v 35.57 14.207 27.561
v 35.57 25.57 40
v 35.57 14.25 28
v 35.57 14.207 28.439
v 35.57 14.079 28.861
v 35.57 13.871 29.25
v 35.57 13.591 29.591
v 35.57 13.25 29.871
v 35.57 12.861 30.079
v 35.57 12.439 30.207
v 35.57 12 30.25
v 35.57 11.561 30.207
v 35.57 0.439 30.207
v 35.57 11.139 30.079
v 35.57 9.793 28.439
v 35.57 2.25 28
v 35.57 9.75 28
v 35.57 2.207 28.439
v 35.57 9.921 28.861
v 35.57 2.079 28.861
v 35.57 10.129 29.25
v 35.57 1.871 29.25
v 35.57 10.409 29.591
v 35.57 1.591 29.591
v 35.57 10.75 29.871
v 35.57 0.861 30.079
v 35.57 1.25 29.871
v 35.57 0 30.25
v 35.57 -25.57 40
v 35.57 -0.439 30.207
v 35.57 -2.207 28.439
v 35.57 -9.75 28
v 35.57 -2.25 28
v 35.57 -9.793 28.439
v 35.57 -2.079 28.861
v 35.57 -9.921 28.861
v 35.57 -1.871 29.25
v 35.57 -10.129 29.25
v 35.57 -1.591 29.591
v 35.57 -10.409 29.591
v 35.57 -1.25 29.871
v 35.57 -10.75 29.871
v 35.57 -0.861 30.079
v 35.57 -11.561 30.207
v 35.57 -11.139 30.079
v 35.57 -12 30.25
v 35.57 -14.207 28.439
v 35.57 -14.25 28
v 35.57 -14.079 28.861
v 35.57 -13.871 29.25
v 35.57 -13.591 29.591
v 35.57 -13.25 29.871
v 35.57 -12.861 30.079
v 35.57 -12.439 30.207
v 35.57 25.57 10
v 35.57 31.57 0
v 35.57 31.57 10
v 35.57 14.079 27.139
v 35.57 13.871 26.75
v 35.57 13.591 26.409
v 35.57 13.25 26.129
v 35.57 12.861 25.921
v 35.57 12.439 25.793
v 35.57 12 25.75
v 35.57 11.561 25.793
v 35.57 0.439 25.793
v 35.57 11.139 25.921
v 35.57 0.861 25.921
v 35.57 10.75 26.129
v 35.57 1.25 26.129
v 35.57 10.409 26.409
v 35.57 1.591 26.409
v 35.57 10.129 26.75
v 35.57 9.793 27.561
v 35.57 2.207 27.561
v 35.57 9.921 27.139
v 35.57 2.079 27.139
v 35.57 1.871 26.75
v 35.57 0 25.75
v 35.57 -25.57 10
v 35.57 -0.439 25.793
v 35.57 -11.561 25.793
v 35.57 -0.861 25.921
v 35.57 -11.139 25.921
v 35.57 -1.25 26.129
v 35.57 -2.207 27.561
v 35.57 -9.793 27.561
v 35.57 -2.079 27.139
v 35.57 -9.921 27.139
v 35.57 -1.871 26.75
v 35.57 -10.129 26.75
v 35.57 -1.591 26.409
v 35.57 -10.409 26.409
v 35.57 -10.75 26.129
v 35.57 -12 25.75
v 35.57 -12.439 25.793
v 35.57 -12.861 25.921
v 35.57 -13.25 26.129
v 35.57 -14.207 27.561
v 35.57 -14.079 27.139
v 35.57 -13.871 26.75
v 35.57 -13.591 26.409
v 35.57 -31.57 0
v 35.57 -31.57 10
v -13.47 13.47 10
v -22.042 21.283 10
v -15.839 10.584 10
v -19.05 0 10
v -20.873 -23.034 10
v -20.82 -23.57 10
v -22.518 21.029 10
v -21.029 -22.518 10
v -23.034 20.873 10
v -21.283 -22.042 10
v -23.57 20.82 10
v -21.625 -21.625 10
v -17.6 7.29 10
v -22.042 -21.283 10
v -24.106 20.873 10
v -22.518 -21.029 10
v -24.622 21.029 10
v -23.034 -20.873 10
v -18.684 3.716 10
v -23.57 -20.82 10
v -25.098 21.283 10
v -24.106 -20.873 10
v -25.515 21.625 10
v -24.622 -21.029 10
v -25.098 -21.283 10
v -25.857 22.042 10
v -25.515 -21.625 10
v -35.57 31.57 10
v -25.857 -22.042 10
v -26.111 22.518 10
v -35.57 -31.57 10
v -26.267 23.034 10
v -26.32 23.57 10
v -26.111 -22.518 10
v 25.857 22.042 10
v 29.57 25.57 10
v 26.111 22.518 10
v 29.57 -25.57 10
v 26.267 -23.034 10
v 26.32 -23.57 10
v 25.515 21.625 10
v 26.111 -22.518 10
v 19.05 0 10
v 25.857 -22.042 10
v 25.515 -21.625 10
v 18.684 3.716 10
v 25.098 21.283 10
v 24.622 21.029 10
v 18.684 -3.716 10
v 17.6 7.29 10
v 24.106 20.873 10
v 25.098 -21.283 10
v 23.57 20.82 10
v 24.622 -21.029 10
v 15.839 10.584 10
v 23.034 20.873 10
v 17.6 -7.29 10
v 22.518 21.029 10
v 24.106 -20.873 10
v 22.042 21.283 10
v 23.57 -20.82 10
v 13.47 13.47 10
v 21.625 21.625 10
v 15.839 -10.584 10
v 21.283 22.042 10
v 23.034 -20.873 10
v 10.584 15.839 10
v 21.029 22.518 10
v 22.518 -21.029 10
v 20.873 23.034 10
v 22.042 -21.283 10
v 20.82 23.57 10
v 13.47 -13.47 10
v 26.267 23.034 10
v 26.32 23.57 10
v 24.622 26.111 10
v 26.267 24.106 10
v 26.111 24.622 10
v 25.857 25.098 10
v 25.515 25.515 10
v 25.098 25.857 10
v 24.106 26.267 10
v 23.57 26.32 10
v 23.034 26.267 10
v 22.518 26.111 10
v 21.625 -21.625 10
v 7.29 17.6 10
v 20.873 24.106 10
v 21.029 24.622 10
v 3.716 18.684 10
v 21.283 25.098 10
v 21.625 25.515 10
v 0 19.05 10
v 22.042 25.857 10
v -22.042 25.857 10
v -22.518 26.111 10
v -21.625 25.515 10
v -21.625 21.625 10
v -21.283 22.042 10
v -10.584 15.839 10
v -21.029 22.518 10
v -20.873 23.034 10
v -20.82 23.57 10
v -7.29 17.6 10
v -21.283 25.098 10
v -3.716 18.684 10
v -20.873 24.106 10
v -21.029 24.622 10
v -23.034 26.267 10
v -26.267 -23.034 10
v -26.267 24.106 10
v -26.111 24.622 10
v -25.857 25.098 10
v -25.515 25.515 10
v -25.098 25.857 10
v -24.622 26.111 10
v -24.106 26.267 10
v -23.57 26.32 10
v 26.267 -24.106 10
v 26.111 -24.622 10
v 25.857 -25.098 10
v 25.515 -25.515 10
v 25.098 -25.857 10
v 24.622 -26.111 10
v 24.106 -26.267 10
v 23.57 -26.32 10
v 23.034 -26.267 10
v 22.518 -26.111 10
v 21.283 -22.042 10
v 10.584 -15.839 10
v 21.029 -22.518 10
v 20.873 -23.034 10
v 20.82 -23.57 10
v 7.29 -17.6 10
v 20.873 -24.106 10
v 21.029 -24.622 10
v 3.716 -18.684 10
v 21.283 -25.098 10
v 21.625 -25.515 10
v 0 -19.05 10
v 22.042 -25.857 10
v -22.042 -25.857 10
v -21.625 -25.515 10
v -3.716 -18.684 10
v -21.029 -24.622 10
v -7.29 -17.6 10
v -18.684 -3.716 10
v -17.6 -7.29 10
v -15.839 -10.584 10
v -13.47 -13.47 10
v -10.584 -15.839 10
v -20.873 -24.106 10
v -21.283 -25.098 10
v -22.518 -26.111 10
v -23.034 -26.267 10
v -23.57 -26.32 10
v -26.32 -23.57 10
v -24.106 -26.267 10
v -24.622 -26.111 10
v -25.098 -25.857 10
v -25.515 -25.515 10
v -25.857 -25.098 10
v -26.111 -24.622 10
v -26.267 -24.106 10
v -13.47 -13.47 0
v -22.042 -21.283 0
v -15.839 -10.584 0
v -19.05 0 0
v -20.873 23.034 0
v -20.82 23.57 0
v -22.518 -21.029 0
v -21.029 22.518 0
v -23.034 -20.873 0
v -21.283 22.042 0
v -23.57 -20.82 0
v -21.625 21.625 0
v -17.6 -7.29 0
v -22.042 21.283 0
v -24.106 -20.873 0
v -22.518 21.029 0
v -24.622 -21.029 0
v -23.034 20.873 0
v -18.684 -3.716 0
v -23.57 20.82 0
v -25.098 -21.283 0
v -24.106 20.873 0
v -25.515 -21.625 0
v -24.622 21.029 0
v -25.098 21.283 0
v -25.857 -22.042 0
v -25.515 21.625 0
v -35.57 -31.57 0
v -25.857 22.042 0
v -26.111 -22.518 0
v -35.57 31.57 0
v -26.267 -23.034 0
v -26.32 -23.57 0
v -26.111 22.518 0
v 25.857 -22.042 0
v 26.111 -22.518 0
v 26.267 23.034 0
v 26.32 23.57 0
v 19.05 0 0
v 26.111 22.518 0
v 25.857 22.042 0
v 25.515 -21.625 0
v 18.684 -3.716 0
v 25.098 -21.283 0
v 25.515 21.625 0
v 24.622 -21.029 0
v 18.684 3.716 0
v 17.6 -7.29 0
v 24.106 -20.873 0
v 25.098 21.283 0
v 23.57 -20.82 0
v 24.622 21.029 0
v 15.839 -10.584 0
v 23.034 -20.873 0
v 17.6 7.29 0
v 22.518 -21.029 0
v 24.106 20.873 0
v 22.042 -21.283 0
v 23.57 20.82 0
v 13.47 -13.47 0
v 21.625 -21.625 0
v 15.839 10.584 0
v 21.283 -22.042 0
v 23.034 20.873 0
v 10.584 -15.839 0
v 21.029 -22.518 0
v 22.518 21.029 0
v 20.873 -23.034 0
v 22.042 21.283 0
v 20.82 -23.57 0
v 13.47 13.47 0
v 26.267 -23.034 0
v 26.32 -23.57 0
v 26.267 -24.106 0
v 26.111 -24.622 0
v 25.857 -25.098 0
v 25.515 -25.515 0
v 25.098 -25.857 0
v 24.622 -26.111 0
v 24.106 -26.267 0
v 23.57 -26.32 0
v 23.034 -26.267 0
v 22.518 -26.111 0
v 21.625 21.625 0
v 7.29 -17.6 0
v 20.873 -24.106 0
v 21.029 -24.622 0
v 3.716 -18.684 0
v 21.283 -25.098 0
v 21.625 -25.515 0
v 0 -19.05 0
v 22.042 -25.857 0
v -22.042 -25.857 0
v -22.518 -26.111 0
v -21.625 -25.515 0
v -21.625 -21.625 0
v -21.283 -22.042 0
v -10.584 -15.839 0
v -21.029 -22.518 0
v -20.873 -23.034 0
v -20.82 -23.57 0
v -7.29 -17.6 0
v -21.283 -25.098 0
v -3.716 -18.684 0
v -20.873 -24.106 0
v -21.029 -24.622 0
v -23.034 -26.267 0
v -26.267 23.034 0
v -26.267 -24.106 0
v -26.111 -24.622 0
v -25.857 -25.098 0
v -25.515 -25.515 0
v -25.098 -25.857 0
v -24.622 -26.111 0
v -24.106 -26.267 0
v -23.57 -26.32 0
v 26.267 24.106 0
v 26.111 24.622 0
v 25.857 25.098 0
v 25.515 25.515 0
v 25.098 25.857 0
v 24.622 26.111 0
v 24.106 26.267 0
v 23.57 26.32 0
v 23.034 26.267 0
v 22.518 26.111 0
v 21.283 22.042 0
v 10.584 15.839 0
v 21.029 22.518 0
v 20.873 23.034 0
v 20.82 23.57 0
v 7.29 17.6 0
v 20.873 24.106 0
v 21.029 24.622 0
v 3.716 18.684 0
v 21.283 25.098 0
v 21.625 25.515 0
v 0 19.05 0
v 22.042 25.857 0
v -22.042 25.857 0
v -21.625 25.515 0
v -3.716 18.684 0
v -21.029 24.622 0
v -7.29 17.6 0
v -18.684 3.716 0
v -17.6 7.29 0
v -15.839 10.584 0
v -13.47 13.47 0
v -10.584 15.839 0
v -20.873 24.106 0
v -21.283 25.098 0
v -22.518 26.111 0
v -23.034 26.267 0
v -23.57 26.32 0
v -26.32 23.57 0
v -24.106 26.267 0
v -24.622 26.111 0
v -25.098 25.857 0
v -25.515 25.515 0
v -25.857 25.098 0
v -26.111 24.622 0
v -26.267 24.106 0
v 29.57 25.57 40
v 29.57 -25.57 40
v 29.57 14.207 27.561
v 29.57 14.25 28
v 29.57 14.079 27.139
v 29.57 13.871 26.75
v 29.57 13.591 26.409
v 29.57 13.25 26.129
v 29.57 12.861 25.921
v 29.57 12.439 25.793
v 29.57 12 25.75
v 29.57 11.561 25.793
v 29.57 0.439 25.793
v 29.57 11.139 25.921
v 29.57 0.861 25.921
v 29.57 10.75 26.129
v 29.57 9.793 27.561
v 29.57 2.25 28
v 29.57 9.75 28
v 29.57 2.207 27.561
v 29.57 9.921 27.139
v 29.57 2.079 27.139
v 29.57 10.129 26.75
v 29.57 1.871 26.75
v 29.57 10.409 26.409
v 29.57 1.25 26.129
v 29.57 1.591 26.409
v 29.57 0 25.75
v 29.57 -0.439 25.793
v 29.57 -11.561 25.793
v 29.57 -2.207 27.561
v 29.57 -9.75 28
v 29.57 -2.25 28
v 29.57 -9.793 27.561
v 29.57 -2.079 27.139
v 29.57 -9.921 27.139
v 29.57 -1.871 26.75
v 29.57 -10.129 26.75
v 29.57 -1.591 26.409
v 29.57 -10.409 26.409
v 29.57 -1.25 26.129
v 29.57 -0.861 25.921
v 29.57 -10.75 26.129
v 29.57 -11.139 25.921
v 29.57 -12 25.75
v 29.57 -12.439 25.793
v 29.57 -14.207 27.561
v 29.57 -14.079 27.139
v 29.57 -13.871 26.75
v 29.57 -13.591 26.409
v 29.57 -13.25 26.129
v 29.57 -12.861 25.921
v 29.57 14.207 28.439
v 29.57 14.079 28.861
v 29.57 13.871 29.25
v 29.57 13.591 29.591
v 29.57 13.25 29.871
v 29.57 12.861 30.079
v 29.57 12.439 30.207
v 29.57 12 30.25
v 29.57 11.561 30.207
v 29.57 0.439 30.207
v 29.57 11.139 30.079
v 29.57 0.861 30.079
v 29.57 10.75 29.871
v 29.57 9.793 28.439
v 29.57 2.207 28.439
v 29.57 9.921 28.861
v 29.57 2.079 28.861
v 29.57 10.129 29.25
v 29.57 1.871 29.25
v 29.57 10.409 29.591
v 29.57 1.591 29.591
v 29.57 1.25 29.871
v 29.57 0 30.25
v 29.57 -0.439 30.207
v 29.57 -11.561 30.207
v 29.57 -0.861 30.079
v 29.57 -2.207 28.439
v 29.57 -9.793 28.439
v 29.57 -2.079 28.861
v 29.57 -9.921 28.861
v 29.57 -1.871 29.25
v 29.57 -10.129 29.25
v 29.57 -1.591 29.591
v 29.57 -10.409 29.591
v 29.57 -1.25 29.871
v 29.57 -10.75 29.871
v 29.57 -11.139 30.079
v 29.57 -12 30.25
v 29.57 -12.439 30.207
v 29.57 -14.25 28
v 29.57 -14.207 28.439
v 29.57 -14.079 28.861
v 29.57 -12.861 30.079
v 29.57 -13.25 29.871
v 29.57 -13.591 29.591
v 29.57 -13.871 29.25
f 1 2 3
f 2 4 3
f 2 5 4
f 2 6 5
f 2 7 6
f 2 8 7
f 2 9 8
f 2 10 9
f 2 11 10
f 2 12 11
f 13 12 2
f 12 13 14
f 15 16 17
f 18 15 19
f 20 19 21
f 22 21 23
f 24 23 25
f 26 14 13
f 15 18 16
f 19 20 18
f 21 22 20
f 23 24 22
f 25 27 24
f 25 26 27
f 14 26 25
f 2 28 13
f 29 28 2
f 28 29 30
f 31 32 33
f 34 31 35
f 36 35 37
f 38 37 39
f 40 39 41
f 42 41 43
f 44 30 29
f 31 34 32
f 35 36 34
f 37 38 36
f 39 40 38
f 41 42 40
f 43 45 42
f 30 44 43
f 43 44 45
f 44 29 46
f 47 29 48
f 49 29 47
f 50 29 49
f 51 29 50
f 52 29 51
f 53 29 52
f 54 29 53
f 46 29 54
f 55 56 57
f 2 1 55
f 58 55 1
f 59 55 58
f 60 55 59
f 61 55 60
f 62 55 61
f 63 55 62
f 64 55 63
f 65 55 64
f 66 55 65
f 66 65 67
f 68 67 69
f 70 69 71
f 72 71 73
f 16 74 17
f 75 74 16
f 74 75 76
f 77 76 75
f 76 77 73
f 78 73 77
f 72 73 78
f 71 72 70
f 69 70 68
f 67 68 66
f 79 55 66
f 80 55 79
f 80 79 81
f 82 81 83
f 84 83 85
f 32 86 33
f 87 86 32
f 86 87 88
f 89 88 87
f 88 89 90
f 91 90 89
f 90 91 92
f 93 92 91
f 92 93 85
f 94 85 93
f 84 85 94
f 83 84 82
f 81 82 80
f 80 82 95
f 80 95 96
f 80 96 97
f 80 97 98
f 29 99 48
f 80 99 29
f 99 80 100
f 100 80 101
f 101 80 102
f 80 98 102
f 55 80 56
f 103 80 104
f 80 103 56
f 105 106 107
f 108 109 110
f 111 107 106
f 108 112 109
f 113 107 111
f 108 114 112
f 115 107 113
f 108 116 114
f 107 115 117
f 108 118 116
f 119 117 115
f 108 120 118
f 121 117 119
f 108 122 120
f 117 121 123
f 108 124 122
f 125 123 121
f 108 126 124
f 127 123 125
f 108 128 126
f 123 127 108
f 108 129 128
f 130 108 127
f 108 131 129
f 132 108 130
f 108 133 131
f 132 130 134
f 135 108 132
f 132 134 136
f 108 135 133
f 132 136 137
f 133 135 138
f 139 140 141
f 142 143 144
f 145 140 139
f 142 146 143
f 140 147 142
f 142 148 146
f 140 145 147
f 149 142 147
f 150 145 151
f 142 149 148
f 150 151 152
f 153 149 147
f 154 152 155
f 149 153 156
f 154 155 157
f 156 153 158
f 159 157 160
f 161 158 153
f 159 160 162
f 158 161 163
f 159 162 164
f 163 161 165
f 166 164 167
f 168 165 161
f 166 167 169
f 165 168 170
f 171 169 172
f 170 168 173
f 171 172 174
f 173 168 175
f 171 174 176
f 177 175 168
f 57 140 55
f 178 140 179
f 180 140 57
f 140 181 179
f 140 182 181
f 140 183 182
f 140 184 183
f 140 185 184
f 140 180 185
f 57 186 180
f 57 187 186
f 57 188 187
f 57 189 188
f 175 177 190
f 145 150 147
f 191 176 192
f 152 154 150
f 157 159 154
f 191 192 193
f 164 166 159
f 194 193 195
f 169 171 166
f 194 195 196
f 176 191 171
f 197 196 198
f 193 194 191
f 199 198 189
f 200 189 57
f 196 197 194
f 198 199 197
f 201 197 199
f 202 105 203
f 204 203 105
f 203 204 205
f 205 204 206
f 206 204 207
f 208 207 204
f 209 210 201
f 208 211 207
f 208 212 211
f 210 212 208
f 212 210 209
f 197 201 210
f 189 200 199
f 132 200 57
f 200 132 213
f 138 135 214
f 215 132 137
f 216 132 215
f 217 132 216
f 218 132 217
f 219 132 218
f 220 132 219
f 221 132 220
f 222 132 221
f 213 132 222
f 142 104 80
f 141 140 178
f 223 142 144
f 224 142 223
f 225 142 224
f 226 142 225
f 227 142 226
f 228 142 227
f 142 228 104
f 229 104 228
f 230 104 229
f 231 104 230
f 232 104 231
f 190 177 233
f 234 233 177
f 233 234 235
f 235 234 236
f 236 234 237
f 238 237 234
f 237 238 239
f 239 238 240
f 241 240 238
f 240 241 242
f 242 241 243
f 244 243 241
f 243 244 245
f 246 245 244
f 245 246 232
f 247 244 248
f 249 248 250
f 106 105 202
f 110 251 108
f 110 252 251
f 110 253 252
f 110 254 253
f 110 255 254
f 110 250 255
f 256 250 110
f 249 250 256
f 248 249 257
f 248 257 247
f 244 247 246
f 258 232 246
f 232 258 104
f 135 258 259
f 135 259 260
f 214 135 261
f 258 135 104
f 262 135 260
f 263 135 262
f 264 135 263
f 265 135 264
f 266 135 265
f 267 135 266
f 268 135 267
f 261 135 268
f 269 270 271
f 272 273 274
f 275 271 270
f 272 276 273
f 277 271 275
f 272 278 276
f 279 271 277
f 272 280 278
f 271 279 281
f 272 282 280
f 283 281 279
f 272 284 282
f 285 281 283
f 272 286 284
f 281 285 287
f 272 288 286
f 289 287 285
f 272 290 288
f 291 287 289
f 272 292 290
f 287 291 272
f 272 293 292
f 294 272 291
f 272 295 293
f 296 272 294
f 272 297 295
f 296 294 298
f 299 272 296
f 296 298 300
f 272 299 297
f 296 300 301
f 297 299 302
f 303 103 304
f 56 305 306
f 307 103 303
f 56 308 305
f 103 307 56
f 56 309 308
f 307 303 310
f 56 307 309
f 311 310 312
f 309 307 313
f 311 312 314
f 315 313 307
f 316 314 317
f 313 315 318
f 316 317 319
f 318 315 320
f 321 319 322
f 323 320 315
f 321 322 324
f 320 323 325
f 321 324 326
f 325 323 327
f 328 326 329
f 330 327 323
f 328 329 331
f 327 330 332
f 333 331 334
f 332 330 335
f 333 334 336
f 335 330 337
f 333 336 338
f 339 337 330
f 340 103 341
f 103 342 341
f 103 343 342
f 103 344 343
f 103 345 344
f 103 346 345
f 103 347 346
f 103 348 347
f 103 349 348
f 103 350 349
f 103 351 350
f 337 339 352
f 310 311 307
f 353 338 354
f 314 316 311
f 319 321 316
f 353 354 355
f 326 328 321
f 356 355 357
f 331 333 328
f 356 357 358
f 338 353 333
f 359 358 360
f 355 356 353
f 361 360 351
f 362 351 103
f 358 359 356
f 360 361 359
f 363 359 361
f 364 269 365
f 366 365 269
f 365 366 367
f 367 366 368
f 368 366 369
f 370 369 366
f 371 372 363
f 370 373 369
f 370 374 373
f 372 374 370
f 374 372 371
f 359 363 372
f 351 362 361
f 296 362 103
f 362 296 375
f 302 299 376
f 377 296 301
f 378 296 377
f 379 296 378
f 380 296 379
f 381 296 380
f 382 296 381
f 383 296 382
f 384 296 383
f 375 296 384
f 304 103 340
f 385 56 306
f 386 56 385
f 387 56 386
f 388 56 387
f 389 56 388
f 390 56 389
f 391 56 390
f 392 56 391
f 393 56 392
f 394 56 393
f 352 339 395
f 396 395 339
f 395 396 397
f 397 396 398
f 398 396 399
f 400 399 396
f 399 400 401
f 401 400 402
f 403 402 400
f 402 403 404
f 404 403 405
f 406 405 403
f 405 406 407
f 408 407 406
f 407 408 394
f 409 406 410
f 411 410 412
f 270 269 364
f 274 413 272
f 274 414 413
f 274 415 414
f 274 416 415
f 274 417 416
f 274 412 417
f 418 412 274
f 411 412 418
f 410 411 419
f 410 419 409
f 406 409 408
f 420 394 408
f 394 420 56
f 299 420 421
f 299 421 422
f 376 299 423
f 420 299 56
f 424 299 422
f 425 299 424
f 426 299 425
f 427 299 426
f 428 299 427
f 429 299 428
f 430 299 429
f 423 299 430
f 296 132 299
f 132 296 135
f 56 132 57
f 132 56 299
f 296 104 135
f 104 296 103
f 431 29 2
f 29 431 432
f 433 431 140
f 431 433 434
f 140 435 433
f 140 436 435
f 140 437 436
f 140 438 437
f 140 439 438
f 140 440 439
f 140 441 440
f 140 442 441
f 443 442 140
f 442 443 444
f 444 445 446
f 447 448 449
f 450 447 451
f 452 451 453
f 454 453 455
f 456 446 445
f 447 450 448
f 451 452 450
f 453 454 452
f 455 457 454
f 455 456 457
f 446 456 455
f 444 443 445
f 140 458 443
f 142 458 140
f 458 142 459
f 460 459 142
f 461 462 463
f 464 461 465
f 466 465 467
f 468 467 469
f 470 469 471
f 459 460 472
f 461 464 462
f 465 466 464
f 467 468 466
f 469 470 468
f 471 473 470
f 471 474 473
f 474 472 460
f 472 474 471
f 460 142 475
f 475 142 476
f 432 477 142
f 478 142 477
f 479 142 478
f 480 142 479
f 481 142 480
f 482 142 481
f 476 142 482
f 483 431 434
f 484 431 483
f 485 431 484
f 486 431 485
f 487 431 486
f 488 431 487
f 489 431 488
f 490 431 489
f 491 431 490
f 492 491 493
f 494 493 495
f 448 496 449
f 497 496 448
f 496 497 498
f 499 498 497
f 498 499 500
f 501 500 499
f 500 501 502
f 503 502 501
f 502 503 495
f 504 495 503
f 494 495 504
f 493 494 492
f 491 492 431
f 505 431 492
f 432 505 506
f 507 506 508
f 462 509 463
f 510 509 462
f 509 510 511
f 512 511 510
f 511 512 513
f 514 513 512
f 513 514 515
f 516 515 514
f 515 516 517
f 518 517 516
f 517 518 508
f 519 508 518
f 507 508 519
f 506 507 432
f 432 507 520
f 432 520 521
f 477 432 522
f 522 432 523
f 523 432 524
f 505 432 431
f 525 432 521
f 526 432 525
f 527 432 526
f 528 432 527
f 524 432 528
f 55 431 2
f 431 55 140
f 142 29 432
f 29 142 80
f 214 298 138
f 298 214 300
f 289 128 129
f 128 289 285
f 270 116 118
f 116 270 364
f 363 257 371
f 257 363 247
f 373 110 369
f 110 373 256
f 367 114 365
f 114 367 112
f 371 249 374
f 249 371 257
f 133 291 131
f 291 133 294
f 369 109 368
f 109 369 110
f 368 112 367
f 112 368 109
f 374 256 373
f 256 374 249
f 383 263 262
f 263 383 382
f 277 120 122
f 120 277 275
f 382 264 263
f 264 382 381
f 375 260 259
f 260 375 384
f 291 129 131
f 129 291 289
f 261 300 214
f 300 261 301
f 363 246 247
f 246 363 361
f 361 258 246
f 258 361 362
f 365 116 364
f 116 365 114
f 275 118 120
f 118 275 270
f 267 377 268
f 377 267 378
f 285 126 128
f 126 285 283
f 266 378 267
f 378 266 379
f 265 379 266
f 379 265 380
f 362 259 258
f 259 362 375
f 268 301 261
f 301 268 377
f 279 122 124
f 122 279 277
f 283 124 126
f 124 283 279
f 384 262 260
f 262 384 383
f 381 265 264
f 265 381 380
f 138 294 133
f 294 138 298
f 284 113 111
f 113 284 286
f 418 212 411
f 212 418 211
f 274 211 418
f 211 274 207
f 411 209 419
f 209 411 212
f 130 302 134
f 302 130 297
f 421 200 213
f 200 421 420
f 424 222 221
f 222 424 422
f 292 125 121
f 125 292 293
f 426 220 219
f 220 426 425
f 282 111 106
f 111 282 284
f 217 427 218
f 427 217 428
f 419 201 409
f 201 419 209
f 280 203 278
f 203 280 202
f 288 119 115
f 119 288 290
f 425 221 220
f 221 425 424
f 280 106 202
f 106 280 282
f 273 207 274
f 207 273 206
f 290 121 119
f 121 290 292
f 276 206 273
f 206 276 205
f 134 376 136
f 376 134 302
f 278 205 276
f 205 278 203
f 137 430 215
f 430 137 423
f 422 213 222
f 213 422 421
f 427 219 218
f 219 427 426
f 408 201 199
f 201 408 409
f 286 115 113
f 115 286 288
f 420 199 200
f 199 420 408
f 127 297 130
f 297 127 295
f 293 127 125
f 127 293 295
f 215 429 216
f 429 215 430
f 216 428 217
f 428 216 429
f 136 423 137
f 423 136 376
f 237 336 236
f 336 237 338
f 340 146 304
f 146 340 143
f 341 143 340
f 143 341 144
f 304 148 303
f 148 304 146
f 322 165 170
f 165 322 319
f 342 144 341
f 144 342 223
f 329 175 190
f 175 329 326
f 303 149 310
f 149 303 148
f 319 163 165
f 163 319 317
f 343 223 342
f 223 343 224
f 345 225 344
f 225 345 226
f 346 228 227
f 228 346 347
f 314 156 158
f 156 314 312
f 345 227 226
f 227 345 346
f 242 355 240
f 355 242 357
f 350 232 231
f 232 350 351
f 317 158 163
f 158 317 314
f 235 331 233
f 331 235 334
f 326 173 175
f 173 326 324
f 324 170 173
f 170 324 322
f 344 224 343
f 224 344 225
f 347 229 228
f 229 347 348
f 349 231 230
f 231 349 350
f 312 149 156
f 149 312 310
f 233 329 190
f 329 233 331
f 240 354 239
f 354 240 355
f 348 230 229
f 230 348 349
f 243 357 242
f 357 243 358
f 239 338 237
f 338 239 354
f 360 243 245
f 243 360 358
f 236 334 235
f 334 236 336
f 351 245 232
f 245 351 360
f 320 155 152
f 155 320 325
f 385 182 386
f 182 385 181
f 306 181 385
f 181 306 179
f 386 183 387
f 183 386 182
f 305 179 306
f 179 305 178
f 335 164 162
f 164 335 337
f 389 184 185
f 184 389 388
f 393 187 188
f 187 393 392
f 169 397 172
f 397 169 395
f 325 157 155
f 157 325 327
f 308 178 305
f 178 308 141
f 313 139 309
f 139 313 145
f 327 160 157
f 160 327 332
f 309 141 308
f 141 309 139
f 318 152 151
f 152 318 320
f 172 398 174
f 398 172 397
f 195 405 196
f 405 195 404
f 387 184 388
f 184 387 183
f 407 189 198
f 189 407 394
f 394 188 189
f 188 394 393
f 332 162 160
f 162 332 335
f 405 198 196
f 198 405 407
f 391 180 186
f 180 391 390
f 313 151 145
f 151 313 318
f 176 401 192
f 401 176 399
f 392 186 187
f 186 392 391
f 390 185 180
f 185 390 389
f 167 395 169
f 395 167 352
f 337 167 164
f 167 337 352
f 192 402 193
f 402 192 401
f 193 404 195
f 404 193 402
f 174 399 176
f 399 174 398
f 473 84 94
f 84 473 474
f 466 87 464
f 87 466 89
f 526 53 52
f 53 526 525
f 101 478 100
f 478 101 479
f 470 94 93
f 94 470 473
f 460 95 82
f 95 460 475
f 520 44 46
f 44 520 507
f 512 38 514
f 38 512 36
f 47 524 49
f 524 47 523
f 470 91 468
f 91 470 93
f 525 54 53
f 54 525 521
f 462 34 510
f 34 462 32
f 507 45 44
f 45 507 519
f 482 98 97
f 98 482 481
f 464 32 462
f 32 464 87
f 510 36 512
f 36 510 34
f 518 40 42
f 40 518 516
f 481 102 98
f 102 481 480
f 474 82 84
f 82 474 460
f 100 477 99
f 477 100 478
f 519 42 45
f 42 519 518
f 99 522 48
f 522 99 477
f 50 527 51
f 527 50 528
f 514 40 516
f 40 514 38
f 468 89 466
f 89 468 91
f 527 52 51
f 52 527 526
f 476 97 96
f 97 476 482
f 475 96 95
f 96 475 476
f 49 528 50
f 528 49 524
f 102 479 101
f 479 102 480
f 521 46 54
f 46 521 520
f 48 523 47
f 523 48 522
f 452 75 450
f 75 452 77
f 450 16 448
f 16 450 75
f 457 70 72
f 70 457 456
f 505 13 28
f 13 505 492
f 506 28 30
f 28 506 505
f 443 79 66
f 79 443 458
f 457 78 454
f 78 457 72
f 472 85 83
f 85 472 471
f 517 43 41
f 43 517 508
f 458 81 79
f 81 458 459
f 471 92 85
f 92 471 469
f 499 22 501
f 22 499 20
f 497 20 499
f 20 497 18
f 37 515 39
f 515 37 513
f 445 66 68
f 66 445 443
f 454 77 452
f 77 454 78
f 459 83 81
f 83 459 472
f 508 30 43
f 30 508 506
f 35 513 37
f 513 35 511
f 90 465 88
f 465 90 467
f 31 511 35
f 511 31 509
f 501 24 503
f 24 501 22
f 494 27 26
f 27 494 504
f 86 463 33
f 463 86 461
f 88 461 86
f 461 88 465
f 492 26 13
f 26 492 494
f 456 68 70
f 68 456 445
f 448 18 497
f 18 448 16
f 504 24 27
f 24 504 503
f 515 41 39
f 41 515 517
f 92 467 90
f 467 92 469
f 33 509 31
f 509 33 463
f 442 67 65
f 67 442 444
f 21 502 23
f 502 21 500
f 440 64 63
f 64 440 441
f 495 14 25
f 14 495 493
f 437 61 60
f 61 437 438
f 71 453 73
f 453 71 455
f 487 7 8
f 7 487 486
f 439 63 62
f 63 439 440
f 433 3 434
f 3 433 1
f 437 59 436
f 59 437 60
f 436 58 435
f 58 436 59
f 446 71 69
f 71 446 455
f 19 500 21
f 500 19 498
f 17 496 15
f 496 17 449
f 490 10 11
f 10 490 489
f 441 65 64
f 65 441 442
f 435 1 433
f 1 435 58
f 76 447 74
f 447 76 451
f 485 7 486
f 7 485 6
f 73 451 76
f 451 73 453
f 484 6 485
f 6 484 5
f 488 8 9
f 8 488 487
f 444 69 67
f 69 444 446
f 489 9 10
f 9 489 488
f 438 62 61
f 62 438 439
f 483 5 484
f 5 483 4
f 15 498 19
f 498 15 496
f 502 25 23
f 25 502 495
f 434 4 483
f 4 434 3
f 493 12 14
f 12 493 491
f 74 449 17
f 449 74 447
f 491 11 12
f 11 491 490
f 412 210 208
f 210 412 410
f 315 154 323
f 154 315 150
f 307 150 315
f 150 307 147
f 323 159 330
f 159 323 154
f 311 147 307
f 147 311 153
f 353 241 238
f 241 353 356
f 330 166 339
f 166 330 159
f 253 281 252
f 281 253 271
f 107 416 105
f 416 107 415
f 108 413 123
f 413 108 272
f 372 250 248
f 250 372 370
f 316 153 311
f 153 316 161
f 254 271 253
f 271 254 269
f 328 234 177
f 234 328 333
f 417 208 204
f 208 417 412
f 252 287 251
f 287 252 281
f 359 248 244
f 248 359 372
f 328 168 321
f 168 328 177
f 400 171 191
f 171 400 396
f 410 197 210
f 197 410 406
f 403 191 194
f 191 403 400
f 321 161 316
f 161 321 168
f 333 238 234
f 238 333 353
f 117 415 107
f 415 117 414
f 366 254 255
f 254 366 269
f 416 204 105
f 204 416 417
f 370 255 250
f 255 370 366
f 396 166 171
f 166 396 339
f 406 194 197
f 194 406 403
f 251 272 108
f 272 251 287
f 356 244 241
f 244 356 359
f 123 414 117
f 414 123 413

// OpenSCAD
$fn = 32;

// ----------------------------------------------------------------------
// Motor mount plate: NEMA23, 71.14 x 63.14 x 50 mm
// ----------------------------------------------------------------------

// --- parameters (mm) ---
plate_w = 71.14;          // plate length, X
plate_d = 63.14;          // plate width, Y
plate_t = 10;             // plate thickness
pattern = 47.14;          // NEMA23 bolt spacing
motor_d = 5.5;            // NEMA23 screw clearance
pilot_d = 38.1;           // pilot boss bore
second_d = 4.5;           // second fastener hole
wall_h = 40;              // upright height
wall_t = 6;               // upright thickness

module plate() {
  translate([-plate_w / 2, -plate_d / 2, 0]) cube([plate_w, plate_d, plate_t]);
}

module motor_holes() {
  for (sx = [-1, 1]) for (sy = [-1, 1])
    translate([sx * pattern / 2, sy * pattern / 2, -1])
      cylinder(h = plate_t + 2, d = motor_d);
}
module upright() {
  /* wall sunk 1 mm into the plate for a positive overlap */
  translate([plate_w / 2 - wall_t, -plate_d / 2 + wall_t, plate_t - 1])
    cube([wall_t, plate_d - 2 * wall_t, wall_h - plate_t + 1]);
}

difference() {
  union() {
    plate();
    upright();
  }
  motor_holes();
  translate([0, 0, -1]) cylinder(h = plate_t + 2, d = pilot_d);
  for (i = [0 : 2])
    translate([plate_w / 2 - wall_t - 1, (i - 1) * wall_h * 0.3, plate_t + wall_h * 0.45]) rotate([0, 90, 0]) cylinder(h = wall_t + 2, d = second_d);
}
